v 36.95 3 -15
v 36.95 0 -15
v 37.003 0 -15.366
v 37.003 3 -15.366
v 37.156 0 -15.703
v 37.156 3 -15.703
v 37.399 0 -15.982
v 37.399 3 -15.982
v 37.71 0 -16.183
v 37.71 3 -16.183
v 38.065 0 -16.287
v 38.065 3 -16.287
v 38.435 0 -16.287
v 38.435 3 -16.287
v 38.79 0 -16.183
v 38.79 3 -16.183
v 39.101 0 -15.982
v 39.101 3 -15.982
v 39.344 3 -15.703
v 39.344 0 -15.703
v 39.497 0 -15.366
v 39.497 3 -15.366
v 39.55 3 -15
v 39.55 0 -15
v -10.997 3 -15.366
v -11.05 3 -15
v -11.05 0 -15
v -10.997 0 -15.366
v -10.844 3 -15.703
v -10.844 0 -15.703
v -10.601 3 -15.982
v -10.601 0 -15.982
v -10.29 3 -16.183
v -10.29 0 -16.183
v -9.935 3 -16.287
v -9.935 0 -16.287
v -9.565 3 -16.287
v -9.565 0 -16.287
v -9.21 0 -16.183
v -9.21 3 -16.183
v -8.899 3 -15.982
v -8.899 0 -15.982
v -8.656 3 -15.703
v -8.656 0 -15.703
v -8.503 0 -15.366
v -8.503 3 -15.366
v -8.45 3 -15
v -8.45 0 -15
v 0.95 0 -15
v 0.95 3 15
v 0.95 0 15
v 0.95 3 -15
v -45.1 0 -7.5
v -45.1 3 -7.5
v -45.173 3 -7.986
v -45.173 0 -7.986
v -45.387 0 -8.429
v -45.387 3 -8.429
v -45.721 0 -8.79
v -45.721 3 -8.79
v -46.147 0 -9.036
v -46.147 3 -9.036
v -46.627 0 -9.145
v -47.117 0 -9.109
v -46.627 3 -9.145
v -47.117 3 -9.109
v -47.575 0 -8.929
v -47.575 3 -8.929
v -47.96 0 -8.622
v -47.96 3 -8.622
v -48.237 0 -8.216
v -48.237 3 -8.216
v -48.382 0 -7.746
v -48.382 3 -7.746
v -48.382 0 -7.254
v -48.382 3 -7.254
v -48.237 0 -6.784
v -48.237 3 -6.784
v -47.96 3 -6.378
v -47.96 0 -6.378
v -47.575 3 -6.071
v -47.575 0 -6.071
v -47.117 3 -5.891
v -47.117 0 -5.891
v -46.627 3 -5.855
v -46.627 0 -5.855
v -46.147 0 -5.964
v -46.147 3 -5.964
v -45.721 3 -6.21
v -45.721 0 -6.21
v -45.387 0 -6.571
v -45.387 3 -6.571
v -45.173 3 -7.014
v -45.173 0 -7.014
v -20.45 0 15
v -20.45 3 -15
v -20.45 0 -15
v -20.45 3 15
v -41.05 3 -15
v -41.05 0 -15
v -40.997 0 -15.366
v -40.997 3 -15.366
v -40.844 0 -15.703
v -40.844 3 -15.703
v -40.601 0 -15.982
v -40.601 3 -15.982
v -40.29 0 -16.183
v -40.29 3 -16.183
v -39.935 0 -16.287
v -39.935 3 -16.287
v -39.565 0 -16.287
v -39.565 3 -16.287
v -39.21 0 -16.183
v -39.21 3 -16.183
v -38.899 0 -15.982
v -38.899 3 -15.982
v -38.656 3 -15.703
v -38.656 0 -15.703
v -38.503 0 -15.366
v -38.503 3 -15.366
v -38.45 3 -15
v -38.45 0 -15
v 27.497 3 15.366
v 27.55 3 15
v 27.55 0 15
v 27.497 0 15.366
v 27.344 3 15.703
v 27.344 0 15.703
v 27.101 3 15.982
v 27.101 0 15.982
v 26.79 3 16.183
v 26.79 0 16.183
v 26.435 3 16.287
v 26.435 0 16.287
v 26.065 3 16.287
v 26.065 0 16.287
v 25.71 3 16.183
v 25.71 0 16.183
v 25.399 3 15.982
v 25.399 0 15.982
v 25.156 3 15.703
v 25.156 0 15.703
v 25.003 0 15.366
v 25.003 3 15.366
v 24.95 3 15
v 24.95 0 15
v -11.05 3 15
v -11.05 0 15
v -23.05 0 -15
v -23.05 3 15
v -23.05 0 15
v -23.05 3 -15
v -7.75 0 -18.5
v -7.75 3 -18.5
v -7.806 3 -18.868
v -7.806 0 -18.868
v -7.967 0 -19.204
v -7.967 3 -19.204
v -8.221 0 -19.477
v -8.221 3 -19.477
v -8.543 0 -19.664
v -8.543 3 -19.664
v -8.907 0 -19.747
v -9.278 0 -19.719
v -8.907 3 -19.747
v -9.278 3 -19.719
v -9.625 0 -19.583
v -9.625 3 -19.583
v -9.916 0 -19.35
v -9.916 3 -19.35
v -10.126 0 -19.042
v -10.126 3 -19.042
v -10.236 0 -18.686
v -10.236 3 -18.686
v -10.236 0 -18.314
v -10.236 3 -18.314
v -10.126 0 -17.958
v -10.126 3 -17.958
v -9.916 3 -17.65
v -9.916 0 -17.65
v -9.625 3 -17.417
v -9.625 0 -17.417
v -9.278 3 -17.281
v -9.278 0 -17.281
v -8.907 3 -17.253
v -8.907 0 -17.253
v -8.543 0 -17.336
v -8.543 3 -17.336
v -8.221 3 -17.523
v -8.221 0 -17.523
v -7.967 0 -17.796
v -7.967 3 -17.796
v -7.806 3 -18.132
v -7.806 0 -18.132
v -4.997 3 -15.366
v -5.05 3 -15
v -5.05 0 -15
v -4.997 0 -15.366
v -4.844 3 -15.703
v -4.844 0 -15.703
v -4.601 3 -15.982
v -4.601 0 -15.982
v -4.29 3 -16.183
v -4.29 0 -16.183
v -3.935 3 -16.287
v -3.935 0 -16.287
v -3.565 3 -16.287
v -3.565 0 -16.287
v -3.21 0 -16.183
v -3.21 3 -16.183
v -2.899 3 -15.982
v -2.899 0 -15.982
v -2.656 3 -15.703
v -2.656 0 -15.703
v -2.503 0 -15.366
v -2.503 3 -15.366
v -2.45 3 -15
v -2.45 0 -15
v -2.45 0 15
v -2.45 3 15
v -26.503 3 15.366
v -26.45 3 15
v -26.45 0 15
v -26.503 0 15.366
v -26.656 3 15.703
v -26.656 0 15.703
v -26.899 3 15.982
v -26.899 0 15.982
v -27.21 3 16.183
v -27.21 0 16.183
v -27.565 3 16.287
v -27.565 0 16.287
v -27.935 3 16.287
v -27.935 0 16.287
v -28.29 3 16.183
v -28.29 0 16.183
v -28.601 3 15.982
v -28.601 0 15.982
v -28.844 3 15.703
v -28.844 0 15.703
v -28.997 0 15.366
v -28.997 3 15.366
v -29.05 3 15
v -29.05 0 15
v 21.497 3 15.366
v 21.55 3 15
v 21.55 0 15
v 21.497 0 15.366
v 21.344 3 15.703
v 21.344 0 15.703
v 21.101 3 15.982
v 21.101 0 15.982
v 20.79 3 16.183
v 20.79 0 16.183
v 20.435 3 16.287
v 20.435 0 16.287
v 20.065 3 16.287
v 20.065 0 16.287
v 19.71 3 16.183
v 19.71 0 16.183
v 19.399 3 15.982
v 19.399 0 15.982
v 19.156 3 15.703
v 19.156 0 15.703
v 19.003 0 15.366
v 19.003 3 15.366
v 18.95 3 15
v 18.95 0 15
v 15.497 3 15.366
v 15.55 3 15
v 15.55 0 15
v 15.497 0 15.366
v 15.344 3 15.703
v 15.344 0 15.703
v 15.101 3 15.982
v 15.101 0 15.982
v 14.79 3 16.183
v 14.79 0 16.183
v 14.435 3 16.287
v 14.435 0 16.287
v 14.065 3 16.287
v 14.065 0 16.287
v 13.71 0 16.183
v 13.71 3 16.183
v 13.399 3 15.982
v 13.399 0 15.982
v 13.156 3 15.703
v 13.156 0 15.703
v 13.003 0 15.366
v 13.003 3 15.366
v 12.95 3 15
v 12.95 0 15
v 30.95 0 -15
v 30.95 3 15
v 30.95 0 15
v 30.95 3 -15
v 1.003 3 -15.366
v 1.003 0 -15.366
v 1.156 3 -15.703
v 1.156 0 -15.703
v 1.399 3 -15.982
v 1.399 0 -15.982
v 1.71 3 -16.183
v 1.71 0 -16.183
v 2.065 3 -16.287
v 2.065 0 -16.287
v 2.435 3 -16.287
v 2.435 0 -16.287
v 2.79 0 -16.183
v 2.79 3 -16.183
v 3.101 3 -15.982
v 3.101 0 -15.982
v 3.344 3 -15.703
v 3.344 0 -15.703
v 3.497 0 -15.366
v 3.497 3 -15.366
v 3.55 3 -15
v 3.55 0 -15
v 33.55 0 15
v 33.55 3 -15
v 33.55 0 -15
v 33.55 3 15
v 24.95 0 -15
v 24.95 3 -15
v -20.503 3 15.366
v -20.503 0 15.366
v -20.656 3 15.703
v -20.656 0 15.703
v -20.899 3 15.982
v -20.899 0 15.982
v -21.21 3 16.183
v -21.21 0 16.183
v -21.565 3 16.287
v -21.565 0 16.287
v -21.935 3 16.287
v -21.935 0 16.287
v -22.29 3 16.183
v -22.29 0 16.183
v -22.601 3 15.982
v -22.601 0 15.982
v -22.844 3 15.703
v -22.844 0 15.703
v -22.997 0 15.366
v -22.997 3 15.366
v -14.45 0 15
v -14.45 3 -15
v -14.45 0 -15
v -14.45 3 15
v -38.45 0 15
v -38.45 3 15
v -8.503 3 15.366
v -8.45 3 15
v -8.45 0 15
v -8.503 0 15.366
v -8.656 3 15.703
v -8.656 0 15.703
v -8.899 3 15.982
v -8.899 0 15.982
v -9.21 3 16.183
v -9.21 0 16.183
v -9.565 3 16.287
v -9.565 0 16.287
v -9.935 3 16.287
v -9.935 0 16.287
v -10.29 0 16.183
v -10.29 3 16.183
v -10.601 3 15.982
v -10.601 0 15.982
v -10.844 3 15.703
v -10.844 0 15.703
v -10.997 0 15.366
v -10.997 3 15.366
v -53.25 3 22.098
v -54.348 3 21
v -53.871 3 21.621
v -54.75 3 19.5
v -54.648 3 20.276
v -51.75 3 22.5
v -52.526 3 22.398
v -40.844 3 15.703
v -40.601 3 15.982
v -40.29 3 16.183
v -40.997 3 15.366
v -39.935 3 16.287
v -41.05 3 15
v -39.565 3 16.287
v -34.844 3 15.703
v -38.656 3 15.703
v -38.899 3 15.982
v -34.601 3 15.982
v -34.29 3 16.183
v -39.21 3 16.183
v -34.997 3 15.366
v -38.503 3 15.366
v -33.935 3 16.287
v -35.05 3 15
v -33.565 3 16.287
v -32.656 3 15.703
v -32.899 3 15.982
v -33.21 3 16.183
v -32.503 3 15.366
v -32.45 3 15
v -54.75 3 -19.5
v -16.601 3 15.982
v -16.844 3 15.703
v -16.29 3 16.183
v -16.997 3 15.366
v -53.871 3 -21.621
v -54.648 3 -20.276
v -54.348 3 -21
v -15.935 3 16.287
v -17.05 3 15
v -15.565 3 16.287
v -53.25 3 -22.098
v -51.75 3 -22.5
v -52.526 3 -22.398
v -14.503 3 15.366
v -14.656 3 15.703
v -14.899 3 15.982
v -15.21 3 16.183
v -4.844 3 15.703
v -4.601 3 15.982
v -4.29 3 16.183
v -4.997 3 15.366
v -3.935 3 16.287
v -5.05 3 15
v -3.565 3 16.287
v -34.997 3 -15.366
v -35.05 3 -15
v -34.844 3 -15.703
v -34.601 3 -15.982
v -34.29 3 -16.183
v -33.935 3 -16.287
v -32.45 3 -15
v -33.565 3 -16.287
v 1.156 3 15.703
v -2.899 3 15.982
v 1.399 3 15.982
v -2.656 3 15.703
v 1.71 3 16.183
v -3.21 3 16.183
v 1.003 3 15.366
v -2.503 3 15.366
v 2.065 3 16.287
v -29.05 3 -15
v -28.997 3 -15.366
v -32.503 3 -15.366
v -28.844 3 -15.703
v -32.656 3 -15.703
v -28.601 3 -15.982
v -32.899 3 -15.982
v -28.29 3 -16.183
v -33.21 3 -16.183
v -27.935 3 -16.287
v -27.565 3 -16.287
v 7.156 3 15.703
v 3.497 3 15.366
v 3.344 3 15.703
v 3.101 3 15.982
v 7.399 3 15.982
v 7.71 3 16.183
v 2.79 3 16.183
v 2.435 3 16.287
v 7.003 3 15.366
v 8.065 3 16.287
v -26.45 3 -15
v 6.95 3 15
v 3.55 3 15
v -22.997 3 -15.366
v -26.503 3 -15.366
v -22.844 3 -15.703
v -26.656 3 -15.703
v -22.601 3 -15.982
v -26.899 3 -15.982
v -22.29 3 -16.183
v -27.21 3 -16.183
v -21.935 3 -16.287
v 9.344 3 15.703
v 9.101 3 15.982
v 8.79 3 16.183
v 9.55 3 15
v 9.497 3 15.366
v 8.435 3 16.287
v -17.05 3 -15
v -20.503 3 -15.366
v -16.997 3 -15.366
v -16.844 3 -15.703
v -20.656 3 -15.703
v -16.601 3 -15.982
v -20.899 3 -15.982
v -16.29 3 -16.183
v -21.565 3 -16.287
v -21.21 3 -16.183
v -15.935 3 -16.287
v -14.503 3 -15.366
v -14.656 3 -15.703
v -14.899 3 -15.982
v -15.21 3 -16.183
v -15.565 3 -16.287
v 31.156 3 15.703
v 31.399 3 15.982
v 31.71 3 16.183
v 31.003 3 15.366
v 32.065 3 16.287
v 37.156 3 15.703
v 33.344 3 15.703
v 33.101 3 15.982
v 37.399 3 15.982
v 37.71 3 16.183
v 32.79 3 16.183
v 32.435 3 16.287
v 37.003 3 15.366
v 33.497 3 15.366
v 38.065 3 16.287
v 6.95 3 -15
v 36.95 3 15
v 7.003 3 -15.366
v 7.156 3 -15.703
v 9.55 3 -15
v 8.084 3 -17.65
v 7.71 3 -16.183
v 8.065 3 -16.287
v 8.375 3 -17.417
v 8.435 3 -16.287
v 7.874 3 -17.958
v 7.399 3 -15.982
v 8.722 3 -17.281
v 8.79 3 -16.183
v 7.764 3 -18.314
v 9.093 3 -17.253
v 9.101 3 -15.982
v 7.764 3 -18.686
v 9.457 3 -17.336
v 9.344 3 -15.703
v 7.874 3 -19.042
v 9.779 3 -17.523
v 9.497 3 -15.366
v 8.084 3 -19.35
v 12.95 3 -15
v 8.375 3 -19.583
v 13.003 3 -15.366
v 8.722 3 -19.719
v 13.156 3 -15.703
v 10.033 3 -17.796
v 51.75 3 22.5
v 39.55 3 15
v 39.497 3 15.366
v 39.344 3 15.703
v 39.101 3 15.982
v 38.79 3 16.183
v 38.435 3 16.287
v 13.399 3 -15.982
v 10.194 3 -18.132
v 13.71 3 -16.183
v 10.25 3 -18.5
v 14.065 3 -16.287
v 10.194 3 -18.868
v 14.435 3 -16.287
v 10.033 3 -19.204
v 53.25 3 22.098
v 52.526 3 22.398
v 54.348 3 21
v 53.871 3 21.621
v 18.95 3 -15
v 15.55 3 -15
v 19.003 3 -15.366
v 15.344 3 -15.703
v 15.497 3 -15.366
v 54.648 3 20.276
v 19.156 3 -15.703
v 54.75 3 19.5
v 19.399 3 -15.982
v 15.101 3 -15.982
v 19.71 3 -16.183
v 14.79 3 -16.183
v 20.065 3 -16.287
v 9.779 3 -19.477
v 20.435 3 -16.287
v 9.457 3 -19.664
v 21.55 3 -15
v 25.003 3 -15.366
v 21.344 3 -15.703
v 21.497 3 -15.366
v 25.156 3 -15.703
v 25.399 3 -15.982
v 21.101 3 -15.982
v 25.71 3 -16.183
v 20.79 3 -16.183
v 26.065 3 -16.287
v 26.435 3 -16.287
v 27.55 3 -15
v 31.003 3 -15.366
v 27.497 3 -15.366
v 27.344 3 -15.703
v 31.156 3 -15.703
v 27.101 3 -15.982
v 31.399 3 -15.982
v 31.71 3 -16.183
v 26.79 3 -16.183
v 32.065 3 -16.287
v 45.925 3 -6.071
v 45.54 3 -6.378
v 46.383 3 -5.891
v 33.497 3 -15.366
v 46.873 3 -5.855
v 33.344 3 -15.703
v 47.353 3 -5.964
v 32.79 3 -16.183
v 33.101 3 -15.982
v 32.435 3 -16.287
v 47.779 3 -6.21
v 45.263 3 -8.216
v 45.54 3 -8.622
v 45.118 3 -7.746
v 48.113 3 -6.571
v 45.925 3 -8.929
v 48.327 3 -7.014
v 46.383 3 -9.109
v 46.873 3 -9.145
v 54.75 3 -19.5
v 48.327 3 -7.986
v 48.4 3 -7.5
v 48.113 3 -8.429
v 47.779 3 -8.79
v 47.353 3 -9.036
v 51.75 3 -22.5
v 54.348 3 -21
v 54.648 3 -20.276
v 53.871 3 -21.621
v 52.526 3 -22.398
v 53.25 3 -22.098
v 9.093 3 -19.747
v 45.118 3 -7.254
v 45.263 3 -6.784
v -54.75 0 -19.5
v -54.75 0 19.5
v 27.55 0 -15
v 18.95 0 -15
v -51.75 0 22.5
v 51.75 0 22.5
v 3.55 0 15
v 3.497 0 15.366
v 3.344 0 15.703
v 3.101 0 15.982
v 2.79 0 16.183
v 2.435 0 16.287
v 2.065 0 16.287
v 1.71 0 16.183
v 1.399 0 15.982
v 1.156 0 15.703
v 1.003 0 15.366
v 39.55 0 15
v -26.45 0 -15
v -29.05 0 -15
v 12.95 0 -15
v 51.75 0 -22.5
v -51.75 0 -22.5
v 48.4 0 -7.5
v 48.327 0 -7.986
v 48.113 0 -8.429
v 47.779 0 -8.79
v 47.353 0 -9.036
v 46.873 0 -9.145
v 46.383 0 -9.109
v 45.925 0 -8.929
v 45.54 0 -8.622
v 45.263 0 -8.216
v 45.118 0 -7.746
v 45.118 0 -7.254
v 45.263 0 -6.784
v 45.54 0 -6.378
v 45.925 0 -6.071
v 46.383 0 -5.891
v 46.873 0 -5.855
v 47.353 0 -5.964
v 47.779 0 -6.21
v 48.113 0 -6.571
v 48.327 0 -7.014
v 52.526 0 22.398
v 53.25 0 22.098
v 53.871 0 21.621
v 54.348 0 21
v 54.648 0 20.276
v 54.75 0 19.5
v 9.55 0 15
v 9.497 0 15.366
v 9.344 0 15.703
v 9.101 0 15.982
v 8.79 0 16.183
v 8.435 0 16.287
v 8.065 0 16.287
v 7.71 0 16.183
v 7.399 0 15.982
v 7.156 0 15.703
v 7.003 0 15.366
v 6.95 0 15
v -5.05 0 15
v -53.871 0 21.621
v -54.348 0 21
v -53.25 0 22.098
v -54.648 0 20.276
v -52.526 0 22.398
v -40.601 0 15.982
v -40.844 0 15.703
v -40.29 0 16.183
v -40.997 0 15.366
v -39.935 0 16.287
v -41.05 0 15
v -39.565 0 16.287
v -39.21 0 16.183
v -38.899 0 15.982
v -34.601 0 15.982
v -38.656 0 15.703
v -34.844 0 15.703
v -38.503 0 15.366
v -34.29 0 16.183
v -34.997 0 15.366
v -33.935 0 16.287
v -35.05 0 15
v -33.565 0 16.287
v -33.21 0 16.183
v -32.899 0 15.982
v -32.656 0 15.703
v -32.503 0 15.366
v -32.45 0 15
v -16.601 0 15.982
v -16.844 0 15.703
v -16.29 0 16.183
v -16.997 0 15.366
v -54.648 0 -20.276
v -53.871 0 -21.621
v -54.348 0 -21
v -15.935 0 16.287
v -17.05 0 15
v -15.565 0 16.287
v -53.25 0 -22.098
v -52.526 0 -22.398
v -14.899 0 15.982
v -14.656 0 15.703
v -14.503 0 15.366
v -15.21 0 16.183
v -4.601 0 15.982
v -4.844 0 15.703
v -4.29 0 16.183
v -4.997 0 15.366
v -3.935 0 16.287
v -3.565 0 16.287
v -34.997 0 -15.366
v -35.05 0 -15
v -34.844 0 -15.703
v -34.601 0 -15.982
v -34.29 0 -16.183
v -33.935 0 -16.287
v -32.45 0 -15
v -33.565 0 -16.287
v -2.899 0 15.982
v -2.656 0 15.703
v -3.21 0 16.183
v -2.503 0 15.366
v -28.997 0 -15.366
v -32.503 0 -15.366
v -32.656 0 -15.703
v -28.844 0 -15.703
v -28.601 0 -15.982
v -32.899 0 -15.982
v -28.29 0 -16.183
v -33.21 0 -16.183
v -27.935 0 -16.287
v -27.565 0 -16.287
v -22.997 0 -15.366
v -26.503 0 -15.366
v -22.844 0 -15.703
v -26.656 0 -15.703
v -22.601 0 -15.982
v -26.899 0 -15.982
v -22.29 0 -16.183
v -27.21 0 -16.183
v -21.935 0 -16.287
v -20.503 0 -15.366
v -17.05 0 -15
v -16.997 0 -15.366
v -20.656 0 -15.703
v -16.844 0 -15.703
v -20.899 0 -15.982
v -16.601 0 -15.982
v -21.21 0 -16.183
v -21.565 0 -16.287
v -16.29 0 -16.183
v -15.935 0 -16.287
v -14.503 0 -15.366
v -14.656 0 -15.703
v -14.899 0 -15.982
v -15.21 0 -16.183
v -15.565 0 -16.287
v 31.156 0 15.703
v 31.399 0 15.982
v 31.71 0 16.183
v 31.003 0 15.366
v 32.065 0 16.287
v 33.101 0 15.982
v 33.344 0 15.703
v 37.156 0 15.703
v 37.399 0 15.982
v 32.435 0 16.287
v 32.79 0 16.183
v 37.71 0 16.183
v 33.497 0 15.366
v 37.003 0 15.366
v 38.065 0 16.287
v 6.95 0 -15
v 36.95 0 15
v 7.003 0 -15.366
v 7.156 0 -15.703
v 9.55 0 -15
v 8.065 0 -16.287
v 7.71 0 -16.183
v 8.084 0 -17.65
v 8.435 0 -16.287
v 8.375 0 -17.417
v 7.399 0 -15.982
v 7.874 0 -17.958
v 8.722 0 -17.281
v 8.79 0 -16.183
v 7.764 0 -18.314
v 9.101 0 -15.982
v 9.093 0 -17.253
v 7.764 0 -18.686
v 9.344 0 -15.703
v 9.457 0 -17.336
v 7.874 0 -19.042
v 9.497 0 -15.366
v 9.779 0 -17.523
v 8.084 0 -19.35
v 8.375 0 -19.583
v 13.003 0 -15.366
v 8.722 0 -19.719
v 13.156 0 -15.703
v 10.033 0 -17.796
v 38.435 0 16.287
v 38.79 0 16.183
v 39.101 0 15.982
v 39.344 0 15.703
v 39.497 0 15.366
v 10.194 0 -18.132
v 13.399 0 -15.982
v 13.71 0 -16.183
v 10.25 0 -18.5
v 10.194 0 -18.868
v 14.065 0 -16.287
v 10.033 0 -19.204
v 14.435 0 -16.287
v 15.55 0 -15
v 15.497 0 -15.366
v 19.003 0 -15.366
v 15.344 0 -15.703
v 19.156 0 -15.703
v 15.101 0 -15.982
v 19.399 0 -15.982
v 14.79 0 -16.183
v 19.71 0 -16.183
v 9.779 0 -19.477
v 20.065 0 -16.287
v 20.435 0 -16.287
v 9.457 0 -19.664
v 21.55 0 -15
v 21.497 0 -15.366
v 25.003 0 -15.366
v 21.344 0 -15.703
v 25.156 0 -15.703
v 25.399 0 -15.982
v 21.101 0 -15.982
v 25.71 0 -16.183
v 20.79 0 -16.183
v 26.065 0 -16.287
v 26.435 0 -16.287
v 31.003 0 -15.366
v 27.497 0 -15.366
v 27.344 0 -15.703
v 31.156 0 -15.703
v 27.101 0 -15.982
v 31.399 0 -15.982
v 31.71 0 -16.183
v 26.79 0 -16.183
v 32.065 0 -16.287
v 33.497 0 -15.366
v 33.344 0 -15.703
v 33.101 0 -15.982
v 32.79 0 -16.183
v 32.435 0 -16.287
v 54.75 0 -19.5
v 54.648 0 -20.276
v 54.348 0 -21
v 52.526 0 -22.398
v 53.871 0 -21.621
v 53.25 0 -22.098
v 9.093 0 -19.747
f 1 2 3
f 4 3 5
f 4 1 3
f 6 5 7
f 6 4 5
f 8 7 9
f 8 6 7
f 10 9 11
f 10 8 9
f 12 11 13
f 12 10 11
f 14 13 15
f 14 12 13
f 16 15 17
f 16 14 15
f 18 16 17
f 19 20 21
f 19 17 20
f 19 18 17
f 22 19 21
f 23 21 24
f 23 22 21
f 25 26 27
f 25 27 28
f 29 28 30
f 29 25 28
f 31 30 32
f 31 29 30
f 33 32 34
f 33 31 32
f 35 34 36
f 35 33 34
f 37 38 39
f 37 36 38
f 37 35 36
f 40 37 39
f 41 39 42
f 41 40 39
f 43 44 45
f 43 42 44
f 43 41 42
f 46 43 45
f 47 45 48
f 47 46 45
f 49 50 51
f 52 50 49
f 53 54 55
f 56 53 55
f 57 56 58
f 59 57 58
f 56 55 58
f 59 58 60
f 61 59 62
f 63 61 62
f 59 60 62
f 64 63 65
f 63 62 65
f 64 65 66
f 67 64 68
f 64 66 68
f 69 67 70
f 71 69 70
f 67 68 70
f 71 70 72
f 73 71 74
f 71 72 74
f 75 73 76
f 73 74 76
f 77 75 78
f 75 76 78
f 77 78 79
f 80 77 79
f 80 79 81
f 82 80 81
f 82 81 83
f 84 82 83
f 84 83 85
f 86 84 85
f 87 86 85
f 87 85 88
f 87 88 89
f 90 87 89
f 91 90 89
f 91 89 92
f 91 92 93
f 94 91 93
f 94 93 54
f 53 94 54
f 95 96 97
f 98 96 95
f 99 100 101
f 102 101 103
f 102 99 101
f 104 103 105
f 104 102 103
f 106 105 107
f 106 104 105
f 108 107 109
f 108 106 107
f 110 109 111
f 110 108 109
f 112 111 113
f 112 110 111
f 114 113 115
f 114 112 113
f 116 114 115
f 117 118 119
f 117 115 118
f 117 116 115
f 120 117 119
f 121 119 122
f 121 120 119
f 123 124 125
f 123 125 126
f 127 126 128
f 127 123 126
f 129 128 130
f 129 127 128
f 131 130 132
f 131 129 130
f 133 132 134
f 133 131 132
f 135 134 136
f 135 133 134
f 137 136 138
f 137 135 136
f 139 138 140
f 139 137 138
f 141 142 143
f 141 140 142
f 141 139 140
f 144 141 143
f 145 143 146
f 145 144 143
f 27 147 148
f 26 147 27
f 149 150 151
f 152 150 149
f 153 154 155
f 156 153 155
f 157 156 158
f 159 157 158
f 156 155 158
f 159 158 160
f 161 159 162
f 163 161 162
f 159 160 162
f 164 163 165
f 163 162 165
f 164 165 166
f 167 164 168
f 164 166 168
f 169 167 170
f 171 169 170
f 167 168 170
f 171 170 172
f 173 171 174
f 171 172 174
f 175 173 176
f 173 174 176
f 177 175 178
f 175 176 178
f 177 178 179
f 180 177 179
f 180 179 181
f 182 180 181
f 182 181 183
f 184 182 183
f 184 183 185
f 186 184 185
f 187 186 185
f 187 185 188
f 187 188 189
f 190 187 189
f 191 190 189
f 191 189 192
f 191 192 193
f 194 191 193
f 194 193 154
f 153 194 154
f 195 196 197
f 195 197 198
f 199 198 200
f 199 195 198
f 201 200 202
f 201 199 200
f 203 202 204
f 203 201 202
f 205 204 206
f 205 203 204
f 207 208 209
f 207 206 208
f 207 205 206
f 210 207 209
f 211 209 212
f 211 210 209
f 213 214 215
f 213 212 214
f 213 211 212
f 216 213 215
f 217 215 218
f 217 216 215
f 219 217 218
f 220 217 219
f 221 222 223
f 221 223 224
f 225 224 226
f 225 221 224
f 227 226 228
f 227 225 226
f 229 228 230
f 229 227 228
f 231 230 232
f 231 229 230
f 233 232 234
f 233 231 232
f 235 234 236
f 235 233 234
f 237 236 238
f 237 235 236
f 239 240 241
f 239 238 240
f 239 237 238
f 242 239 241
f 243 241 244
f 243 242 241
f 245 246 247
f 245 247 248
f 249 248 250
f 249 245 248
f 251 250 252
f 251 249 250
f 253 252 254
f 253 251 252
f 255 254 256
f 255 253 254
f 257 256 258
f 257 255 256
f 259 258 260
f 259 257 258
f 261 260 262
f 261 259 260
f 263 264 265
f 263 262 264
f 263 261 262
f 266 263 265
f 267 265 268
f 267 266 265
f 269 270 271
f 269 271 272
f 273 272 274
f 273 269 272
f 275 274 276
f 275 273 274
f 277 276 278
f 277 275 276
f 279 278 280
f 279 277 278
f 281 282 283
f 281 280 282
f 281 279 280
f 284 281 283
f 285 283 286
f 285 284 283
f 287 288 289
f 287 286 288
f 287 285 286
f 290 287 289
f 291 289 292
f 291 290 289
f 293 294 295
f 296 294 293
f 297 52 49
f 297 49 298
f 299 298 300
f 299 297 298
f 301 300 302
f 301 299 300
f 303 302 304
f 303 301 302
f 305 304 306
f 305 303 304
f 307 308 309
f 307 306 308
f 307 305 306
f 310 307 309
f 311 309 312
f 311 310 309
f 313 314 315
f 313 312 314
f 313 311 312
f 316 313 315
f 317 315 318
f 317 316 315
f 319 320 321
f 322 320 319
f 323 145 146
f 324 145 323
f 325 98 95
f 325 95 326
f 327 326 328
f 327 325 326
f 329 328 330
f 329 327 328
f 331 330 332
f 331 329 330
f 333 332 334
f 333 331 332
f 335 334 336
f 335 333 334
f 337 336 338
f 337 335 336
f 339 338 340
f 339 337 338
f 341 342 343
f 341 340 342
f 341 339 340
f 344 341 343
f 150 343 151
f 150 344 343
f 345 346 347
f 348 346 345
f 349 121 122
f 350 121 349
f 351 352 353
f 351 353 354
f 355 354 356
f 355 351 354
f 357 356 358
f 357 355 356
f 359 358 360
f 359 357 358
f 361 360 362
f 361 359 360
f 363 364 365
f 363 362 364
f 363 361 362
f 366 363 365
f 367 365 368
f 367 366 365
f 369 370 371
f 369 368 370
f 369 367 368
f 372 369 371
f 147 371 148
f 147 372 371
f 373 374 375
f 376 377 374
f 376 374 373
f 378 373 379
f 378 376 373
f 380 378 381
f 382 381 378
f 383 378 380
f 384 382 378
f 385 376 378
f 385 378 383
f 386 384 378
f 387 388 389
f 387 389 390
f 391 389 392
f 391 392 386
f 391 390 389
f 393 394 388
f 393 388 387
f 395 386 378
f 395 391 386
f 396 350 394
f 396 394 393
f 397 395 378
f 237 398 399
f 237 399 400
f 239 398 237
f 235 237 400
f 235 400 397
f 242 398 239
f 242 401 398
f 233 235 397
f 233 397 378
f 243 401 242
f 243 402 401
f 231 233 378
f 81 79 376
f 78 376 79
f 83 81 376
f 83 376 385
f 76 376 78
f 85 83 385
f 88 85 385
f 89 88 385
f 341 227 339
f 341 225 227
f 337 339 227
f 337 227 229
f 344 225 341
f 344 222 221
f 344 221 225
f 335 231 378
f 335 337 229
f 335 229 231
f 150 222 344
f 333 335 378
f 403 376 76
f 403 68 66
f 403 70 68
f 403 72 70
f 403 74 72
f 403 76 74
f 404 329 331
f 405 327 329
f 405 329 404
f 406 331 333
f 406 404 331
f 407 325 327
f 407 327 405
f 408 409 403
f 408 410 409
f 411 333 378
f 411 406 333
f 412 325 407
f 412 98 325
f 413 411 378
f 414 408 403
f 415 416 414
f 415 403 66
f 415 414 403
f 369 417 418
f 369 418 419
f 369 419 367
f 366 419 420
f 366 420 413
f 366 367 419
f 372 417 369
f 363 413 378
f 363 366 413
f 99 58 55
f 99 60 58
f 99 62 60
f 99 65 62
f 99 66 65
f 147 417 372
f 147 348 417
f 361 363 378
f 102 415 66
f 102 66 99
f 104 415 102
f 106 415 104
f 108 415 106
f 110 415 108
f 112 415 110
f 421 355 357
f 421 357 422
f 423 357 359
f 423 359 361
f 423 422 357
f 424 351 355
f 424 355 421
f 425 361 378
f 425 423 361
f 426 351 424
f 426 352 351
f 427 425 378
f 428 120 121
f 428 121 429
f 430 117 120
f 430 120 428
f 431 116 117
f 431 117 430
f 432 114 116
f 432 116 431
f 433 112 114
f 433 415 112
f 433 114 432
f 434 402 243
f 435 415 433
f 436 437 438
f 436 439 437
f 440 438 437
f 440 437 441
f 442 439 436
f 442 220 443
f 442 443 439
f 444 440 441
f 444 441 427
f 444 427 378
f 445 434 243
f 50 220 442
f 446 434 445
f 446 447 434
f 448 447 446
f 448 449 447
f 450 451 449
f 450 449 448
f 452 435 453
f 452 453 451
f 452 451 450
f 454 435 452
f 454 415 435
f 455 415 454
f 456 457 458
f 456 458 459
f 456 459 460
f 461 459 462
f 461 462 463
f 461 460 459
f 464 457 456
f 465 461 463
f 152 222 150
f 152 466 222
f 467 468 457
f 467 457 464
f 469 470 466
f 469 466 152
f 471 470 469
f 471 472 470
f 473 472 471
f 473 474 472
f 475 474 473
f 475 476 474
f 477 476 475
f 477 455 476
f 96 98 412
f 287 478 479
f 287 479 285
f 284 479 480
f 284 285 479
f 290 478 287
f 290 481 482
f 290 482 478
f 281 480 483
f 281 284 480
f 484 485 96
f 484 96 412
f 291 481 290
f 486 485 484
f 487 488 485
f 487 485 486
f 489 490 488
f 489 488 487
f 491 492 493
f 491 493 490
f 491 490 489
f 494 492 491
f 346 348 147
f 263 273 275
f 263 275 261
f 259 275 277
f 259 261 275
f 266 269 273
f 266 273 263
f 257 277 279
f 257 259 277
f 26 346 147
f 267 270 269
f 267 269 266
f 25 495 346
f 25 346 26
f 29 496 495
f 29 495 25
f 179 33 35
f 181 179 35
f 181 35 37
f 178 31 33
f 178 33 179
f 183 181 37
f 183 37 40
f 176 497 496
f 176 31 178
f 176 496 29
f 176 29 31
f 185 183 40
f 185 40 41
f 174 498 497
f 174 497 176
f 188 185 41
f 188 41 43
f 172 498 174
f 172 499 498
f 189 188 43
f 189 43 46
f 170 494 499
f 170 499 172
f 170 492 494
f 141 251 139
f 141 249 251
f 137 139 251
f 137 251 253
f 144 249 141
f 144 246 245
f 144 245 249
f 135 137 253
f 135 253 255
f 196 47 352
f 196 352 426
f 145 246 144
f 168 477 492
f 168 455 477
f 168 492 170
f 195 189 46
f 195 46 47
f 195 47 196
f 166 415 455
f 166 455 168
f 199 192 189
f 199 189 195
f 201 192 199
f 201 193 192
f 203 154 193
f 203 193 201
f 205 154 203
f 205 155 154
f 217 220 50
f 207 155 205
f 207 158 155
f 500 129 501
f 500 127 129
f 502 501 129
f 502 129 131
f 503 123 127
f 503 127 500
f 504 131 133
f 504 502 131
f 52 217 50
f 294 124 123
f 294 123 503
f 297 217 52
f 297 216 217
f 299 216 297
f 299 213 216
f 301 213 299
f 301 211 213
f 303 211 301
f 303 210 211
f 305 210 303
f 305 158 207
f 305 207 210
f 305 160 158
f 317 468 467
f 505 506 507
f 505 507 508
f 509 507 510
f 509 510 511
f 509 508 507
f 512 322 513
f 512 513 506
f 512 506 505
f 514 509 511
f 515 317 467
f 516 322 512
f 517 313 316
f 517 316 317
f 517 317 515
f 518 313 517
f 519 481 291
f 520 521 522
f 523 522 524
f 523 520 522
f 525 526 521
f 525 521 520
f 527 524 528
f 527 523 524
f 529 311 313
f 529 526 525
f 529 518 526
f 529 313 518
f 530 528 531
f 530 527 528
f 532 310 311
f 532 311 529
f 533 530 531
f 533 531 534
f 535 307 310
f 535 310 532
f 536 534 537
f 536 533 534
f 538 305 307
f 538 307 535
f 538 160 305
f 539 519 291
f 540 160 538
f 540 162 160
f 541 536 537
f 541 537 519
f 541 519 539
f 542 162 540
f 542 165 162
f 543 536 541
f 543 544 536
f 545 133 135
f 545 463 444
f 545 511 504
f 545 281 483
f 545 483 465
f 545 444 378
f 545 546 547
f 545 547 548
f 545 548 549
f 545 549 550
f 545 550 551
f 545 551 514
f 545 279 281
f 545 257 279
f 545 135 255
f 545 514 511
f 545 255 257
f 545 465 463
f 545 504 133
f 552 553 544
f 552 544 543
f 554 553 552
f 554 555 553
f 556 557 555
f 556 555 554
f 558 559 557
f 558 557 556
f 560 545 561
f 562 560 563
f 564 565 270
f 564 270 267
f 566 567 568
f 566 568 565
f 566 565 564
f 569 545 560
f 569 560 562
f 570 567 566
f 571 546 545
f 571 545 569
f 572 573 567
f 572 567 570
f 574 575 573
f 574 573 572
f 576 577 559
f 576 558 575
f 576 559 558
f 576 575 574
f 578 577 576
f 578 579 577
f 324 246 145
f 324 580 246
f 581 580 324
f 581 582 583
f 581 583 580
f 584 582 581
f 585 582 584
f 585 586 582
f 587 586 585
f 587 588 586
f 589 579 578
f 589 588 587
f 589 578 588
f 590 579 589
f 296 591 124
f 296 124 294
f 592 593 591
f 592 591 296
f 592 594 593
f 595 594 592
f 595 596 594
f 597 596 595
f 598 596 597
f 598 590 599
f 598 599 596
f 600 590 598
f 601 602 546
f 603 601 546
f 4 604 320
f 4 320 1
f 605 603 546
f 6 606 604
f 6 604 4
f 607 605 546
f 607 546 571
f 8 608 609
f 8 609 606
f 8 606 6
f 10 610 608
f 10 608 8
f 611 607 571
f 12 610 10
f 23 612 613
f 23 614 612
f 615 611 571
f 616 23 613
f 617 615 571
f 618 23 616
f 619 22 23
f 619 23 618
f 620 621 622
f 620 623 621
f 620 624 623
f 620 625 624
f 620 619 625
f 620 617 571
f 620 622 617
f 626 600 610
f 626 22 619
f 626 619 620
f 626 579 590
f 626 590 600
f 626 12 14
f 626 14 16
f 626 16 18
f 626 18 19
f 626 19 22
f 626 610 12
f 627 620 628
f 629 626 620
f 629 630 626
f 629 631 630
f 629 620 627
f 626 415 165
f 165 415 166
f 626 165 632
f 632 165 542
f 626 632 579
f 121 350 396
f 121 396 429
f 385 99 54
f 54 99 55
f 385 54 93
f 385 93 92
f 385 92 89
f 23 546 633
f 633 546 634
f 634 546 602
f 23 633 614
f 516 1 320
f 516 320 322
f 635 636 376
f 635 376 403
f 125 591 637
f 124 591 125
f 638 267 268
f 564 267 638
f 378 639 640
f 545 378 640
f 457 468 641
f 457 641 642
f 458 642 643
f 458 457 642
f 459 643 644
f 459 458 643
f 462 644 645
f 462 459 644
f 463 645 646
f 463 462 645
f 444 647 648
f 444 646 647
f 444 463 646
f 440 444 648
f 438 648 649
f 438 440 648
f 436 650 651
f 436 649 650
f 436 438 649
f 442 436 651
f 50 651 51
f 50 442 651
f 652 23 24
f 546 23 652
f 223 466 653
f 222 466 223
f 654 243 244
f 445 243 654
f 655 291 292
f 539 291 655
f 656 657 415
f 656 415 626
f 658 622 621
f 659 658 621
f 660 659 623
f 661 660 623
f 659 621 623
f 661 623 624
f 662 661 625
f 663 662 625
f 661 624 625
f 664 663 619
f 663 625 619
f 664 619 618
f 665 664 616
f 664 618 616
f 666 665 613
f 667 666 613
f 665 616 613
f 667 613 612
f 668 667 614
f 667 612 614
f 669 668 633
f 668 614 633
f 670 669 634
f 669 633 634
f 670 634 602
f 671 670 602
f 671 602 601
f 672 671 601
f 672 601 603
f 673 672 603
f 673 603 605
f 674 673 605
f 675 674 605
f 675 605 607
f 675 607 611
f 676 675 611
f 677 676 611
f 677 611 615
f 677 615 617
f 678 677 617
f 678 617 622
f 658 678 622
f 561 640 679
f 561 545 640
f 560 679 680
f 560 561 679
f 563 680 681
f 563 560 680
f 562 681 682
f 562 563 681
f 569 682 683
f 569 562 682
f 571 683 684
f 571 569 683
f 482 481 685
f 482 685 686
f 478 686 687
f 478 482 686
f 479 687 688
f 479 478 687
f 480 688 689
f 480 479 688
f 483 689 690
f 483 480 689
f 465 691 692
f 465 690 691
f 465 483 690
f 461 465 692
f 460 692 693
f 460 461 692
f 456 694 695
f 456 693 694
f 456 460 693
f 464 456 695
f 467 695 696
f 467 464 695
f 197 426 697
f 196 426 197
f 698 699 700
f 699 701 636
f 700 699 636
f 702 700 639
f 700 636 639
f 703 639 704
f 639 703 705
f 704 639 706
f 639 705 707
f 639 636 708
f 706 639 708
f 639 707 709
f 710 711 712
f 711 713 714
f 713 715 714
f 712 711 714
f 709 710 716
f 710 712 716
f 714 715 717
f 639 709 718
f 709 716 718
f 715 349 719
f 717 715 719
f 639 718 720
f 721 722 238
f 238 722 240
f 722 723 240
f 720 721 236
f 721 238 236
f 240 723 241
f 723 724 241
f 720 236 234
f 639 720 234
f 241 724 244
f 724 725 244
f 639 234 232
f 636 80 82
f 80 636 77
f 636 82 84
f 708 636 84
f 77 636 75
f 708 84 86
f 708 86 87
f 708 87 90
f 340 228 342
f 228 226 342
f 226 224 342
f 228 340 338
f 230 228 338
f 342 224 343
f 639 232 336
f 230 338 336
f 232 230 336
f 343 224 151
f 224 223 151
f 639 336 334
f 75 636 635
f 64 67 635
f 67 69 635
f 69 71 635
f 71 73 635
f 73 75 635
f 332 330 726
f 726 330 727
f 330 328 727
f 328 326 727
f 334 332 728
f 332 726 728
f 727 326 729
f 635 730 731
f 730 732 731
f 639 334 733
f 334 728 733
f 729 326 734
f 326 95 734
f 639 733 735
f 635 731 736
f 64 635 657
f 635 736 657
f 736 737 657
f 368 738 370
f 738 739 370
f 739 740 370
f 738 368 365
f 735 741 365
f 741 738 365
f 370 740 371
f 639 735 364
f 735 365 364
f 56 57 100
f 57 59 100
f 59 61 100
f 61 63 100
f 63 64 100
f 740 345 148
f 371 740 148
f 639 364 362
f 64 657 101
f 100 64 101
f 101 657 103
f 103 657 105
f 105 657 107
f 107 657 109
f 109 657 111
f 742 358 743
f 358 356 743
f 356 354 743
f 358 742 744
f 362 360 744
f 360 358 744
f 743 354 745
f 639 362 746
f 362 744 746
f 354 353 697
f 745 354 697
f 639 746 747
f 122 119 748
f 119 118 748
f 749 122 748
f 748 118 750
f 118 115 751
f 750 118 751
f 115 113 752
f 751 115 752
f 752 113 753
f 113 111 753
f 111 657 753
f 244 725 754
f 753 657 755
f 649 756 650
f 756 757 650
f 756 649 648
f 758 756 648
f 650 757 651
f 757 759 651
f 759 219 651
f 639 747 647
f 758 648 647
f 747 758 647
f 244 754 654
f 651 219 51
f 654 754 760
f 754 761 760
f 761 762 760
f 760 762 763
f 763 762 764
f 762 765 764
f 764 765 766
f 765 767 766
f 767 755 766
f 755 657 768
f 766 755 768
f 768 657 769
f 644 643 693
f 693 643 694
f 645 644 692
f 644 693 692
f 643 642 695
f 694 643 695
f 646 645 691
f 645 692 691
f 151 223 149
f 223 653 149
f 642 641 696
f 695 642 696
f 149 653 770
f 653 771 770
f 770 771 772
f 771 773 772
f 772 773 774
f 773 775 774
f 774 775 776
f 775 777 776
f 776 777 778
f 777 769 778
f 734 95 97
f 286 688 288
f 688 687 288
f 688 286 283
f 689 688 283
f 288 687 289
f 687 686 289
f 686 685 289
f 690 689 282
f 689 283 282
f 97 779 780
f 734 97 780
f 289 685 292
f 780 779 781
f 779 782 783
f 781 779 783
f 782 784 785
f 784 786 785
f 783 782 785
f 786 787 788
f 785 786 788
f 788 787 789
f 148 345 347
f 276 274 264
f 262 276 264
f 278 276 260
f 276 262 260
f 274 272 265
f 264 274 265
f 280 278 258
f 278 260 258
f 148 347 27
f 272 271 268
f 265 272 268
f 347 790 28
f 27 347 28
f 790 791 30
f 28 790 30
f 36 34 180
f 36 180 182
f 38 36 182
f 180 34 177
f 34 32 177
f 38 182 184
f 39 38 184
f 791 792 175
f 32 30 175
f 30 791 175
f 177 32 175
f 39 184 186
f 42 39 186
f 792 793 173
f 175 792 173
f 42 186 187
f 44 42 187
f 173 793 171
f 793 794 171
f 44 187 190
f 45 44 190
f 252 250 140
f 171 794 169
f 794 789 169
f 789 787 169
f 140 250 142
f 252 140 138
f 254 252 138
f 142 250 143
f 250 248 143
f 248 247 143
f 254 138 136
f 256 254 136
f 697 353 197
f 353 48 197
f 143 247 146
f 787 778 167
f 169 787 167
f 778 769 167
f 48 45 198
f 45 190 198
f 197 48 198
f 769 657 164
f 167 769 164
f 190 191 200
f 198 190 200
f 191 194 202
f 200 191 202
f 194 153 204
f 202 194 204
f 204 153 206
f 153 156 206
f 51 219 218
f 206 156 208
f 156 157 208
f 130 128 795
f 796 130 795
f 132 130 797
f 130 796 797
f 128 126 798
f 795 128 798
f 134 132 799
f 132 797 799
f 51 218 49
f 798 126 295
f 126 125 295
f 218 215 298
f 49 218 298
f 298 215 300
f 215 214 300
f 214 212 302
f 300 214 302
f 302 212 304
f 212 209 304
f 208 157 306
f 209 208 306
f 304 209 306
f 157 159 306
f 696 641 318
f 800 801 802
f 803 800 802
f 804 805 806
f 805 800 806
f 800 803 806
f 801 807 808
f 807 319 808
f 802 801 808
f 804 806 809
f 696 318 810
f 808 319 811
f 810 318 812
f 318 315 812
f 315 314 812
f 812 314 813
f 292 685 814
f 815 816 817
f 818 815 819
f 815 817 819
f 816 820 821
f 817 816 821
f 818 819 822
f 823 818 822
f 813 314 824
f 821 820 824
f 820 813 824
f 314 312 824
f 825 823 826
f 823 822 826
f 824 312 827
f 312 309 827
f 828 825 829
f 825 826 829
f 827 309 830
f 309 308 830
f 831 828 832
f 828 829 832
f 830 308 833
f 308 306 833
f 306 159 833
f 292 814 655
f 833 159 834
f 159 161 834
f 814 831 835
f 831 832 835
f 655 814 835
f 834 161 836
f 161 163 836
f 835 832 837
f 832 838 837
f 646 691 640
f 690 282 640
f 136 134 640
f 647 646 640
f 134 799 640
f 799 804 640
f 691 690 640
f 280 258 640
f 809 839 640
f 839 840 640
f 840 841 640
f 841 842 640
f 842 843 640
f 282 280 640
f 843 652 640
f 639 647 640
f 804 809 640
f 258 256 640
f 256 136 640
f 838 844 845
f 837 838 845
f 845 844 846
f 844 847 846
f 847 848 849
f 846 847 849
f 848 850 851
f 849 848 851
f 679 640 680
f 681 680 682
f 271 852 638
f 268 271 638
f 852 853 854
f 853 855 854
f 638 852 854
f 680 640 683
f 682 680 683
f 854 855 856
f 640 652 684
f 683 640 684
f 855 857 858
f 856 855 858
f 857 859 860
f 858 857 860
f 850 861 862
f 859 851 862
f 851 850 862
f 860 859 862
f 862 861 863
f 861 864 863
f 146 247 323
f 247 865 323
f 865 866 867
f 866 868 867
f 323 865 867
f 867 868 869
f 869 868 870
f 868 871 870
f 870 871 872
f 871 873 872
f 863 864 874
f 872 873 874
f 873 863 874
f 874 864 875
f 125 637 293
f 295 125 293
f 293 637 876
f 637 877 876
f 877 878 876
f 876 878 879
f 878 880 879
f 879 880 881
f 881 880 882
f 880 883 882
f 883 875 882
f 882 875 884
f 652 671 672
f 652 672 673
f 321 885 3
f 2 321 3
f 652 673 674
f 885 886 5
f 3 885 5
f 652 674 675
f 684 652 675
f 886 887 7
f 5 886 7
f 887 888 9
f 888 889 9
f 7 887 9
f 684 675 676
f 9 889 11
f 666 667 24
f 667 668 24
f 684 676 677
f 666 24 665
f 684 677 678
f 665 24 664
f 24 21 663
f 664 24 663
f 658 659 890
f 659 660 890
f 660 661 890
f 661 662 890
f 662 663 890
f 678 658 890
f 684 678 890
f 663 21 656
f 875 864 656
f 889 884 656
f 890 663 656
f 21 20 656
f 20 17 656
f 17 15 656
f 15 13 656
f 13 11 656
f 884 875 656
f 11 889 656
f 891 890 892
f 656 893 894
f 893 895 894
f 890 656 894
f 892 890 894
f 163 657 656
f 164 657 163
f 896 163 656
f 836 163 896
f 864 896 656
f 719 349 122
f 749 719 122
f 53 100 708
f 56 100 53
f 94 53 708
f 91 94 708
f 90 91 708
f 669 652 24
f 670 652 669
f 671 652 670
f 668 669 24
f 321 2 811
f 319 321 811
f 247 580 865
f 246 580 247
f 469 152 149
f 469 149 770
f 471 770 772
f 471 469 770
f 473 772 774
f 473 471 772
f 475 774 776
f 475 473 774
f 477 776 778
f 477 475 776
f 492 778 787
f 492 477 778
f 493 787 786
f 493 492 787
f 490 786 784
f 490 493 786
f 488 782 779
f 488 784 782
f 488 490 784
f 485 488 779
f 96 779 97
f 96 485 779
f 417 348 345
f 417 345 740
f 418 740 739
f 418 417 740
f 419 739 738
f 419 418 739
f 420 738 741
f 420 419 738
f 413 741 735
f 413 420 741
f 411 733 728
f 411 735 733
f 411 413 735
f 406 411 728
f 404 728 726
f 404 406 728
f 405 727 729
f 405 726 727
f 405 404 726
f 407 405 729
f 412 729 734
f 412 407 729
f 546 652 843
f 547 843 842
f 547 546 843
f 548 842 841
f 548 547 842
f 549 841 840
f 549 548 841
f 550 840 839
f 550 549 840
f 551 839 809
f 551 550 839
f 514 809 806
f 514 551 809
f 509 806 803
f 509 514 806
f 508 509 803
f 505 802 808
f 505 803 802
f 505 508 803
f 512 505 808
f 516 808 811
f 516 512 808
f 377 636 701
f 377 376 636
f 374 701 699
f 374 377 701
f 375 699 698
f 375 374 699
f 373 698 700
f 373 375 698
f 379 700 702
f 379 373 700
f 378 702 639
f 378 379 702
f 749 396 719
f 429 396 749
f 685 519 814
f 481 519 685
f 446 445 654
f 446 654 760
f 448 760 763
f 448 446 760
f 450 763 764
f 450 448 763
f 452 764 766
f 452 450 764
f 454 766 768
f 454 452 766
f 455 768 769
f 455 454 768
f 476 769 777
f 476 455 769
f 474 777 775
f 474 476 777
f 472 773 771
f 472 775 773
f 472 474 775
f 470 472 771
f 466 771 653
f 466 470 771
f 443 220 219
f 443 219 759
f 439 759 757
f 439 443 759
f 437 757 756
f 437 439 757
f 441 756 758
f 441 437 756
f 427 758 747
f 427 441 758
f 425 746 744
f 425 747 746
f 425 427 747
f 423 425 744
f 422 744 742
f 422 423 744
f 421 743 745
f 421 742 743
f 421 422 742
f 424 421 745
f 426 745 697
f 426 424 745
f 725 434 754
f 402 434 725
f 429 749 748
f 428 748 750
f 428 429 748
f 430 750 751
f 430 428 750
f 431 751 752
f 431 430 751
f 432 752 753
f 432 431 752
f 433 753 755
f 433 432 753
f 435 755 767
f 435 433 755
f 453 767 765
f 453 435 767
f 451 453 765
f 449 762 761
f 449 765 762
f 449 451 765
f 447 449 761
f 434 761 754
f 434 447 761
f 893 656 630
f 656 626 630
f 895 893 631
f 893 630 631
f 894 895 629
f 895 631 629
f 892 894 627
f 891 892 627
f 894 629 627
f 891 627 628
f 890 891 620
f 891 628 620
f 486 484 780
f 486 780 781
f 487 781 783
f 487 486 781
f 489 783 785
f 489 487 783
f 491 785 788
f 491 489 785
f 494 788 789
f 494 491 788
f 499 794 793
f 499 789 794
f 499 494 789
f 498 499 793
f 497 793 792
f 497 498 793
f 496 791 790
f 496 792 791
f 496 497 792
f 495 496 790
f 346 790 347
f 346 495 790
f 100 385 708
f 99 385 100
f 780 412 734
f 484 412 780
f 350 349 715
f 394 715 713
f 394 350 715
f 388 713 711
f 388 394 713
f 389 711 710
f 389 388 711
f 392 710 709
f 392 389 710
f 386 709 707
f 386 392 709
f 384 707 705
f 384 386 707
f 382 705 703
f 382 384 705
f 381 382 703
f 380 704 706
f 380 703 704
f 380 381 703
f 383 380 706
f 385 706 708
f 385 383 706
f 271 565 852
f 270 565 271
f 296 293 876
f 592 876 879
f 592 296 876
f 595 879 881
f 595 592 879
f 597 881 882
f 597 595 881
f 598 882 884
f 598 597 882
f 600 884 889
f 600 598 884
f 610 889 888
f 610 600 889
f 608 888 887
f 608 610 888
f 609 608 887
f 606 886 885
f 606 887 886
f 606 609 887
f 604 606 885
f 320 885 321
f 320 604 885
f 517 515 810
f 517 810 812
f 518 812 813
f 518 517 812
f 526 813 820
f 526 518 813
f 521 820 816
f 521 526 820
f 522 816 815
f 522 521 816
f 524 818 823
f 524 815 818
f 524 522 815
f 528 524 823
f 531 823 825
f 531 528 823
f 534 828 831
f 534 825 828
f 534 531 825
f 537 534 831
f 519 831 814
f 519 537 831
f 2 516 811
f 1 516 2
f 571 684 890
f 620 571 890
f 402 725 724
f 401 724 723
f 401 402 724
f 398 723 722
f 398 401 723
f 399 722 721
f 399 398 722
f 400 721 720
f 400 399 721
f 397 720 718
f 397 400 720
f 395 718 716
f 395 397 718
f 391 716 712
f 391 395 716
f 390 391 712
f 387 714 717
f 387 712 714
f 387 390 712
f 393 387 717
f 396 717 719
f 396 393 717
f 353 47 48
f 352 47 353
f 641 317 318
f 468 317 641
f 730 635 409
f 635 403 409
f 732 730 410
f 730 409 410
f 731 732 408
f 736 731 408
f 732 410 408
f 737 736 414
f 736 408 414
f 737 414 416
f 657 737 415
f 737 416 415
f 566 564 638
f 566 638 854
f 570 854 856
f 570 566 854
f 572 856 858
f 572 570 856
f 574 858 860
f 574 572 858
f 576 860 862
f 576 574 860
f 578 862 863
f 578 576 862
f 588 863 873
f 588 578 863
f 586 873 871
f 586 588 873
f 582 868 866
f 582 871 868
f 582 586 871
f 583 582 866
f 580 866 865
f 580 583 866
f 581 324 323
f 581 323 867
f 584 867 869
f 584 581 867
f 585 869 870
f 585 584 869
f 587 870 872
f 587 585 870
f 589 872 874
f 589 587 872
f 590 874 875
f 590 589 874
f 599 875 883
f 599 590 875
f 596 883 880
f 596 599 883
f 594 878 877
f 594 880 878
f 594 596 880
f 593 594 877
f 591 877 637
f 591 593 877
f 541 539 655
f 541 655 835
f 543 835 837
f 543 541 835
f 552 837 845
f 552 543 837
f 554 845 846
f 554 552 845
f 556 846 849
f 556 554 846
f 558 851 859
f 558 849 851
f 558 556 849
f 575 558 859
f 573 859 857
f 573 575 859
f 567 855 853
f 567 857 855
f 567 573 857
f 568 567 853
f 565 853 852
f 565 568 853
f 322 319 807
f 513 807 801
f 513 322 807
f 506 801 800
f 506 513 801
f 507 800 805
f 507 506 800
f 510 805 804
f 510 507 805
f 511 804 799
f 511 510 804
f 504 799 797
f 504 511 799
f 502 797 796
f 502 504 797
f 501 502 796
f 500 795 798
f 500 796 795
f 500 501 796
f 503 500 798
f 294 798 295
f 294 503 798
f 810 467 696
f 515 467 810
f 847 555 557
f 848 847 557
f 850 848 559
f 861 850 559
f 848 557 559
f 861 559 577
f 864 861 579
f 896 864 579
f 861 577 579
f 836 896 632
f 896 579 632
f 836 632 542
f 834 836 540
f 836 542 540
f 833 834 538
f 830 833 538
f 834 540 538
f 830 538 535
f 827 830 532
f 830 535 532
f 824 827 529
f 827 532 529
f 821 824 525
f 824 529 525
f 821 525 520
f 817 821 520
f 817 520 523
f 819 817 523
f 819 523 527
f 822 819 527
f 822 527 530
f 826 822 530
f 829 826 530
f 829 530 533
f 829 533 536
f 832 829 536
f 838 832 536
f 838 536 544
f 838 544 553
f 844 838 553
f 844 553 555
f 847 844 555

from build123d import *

# Parameters (mm, degrees)
SKETCH_1_W          = 109.5
SKETCH_1_H          = 45
EXTRUDE_1_DEPTH     = 3
SKETCH_2_R          = 1.25
CUT_EXTRUDE_1_DEPTH = 10
SKETCH_3_R          = 1.65
CUT_EXTRUDE_2_DEPTH = 10
FILLET_1_R          = 3
CUT_EXTRUDE_3_DEPTH = 4


with BuildPart() as part:
    # 草图1 → 凸台-拉伸1 (new body)
    with BuildSketch(Plane(origin=(0, 0, 0), x_dir=(1, 0, 0), z_dir=(0, 1, 0))):
        Rectangle(SKETCH_1_W, SKETCH_1_H)
    extrude(amount=EXTRUDE_1_DEPTH)

    # 草图2 → 切除-拉伸1 (cut)
    with BuildSketch(Plane(origin=(0, 3, 0), x_dir=(1, 0, 0), z_dir=(0, 1, 0))):
        with Locations((9, 18.5)):
            Circle(SKETCH_2_R)
        with Locations((-9, 18.5)):
            Circle(SKETCH_2_R)
    extrude(amount=-CUT_EXTRUDE_1_DEPTH, mode=Mode.SUBTRACT)

    # 草图3 → 切除-拉伸2 (cut)
    with BuildSketch(Plane(origin=(0, 3, 0), x_dir=(1, 0, 0), z_dir=(0, 1, 0))):
        with Locations((-46.75, 7.5)):
            Circle(SKETCH_3_R)
        with Locations((46.75, 7.5)):
            Circle(SKETCH_3_R)
    extrude(amount=-CUT_EXTRUDE_2_DEPTH, mode=Mode.SUBTRACT)

    # 圆角1
    fillet_1_edges = [part.edges().sort_by_distance(p)[0] for p in [
        (54.75, 1.5, 22.5),
        (-54.75, 1.5, 22.5),
        (-54.75, 1.5, -22.5),
        (54.75, 1.5, -22.5),
    ]]
    fillet(fillet_1_edges, radius=FILLET_1_R)

    # 草图4 → 切除-拉伸3 (cut, through all)
    with BuildSketch(Plane(origin=(0, 3, 0), x_dir=(1, 0, 0), z_dir=(0, 1, 0))):
        with BuildLine():
            Line((-38.45, 15), (-38.45, -15))
            ThreePointArc((-38.45, -15), (-39.75, -16.3), (-41.05, -15))
            Line((-41.05, -15), (-41.05, 15))
            ThreePointArc((-41.05, 15), (-39.75, 16.3), (-38.45, 15))
        make_face()
        with BuildLine():
            Line((-32.45, 15), (-32.45, -15))
            ThreePointArc((-32.45, -15), (-33.75, -16.3), (-35.05, -15))
            Line((-35.05, -15), (-35.05, 15))
            ThreePointArc((-35.05, 15), (-33.75, 16.3), (-32.45, 15))
        make_face()
        with BuildLine():
            Line((-26.45, 15), (-26.45, -15))
            ThreePointArc((-26.45, -15), (-27.75, -16.3), (-29.05, -15))
            Line((-29.05, -15), (-29.05, 15))
            ThreePointArc((-29.05, 15), (-27.75, 16.3), (-26.45, 15))
        make_face()
        with BuildLine():
            Line((-20.45, 15), (-20.45, -15))
            ThreePointArc((-20.45, -15), (-21.75, -16.3), (-23.05, -15))
            Line((-23.05, -15), (-23.05, 15))
            ThreePointArc((-23.05, 15), (-21.75, 16.3), (-20.45, 15))
        make_face()
        with BuildLine():
            Line((-14.45, 15), (-14.45, -15))
            ThreePointArc((-14.45, -15), (-15.75, -16.3), (-17.05, -15))
            Line((-17.05, -15), (-17.05, 15))
            ThreePointArc((-17.05, 15), (-15.75, 16.3), (-14.45, 15))
        make_face()
        with BuildLine():
            Line((-8.45, 15), (-8.45, -15))
            ThreePointArc((-8.45, -15), (-9.75, -16.3), (-11.05, -15))
            Line((-11.05, -15), (-11.05, 15))
            ThreePointArc((-11.05, 15), (-9.75, 16.3), (-8.45, 15))
        make_face()
        with BuildLine():
            Line((-2.45, 15), (-2.45, -15))
            ThreePointArc((-2.45, -15), (-3.75, -16.3), (-5.05, -15))
            Line((-5.05, -15), (-5.05, 15))
            ThreePointArc((-5.05, 15), (-3.75, 16.3), (-2.45, 15))
        make_face()
        with BuildLine():
            Line((3.55, 15), (3.55, -15))
            ThreePointArc((3.55, -15), (2.25, -16.3), (0.95, -15))
            Line((0.95, -15), (0.95, 15))
            ThreePointArc((0.95, 15), (2.25, 16.3), (3.55, 15))
        make_face()
        with BuildLine():
            Line((9.55, 15), (9.55, -15))
            ThreePointArc((9.55, -15), (8.25, -16.3), (6.95, -15))
            Line((6.95, -15), (6.95, 15))
            ThreePointArc((6.95, 15), (8.25, 16.3), (9.55, 15))
        make_face()
        with BuildLine():
            Line((15.55, 15), (15.55, -15))
            ThreePointArc((15.55, -15), (14.25, -16.3), (12.95, -15))
            Line((12.95, -15), (12.95, 15))
            ThreePointArc((12.95, 15), (14.25, 16.3), (15.55, 15))
        make_face()
        with BuildLine():
            Line((21.55, 15), (21.55, -15))
            ThreePointArc((21.55, -15), (20.25, -16.3), (18.95, -15))
            Line((18.95, -15), (18.95, 15))
            ThreePointArc((18.95, 15), (20.25, 16.3), (21.55, 15))
        make_face()
        with BuildLine():
            Line((27.55, 15), (27.55, -15))
            ThreePointArc((27.55, -15), (26.25, -16.3), (24.95, -15))
            Line((24.95, -15), (24.95, 15))
            ThreePointArc((24.95, 15), (26.25, 16.3), (27.55, 15))
        make_face()
        with BuildLine():
            Line((33.55, 15), (33.55, -15))
            ThreePointArc((33.55, -15), (32.25, -16.3), (30.95, -15))
            Line((30.95, -15), (30.95, 15))
            ThreePointArc((30.95, 15), (32.25, 16.3), (33.55, 15))
        make_face()
        with BuildLine():
            Line((39.55, 15), (39.55, -15))
            ThreePointArc((39.55, -15), (38.25, -16.3), (36.95, -15))
            Line((36.95, -15), (36.95, 15))
            ThreePointArc((36.95, 15), (38.25, 16.3), (39.55, 15))
        make_face()
    extrude(amount=-CUT_EXTRUDE_3_DEPTH, mode=Mode.SUBTRACT)


solid = part.part
